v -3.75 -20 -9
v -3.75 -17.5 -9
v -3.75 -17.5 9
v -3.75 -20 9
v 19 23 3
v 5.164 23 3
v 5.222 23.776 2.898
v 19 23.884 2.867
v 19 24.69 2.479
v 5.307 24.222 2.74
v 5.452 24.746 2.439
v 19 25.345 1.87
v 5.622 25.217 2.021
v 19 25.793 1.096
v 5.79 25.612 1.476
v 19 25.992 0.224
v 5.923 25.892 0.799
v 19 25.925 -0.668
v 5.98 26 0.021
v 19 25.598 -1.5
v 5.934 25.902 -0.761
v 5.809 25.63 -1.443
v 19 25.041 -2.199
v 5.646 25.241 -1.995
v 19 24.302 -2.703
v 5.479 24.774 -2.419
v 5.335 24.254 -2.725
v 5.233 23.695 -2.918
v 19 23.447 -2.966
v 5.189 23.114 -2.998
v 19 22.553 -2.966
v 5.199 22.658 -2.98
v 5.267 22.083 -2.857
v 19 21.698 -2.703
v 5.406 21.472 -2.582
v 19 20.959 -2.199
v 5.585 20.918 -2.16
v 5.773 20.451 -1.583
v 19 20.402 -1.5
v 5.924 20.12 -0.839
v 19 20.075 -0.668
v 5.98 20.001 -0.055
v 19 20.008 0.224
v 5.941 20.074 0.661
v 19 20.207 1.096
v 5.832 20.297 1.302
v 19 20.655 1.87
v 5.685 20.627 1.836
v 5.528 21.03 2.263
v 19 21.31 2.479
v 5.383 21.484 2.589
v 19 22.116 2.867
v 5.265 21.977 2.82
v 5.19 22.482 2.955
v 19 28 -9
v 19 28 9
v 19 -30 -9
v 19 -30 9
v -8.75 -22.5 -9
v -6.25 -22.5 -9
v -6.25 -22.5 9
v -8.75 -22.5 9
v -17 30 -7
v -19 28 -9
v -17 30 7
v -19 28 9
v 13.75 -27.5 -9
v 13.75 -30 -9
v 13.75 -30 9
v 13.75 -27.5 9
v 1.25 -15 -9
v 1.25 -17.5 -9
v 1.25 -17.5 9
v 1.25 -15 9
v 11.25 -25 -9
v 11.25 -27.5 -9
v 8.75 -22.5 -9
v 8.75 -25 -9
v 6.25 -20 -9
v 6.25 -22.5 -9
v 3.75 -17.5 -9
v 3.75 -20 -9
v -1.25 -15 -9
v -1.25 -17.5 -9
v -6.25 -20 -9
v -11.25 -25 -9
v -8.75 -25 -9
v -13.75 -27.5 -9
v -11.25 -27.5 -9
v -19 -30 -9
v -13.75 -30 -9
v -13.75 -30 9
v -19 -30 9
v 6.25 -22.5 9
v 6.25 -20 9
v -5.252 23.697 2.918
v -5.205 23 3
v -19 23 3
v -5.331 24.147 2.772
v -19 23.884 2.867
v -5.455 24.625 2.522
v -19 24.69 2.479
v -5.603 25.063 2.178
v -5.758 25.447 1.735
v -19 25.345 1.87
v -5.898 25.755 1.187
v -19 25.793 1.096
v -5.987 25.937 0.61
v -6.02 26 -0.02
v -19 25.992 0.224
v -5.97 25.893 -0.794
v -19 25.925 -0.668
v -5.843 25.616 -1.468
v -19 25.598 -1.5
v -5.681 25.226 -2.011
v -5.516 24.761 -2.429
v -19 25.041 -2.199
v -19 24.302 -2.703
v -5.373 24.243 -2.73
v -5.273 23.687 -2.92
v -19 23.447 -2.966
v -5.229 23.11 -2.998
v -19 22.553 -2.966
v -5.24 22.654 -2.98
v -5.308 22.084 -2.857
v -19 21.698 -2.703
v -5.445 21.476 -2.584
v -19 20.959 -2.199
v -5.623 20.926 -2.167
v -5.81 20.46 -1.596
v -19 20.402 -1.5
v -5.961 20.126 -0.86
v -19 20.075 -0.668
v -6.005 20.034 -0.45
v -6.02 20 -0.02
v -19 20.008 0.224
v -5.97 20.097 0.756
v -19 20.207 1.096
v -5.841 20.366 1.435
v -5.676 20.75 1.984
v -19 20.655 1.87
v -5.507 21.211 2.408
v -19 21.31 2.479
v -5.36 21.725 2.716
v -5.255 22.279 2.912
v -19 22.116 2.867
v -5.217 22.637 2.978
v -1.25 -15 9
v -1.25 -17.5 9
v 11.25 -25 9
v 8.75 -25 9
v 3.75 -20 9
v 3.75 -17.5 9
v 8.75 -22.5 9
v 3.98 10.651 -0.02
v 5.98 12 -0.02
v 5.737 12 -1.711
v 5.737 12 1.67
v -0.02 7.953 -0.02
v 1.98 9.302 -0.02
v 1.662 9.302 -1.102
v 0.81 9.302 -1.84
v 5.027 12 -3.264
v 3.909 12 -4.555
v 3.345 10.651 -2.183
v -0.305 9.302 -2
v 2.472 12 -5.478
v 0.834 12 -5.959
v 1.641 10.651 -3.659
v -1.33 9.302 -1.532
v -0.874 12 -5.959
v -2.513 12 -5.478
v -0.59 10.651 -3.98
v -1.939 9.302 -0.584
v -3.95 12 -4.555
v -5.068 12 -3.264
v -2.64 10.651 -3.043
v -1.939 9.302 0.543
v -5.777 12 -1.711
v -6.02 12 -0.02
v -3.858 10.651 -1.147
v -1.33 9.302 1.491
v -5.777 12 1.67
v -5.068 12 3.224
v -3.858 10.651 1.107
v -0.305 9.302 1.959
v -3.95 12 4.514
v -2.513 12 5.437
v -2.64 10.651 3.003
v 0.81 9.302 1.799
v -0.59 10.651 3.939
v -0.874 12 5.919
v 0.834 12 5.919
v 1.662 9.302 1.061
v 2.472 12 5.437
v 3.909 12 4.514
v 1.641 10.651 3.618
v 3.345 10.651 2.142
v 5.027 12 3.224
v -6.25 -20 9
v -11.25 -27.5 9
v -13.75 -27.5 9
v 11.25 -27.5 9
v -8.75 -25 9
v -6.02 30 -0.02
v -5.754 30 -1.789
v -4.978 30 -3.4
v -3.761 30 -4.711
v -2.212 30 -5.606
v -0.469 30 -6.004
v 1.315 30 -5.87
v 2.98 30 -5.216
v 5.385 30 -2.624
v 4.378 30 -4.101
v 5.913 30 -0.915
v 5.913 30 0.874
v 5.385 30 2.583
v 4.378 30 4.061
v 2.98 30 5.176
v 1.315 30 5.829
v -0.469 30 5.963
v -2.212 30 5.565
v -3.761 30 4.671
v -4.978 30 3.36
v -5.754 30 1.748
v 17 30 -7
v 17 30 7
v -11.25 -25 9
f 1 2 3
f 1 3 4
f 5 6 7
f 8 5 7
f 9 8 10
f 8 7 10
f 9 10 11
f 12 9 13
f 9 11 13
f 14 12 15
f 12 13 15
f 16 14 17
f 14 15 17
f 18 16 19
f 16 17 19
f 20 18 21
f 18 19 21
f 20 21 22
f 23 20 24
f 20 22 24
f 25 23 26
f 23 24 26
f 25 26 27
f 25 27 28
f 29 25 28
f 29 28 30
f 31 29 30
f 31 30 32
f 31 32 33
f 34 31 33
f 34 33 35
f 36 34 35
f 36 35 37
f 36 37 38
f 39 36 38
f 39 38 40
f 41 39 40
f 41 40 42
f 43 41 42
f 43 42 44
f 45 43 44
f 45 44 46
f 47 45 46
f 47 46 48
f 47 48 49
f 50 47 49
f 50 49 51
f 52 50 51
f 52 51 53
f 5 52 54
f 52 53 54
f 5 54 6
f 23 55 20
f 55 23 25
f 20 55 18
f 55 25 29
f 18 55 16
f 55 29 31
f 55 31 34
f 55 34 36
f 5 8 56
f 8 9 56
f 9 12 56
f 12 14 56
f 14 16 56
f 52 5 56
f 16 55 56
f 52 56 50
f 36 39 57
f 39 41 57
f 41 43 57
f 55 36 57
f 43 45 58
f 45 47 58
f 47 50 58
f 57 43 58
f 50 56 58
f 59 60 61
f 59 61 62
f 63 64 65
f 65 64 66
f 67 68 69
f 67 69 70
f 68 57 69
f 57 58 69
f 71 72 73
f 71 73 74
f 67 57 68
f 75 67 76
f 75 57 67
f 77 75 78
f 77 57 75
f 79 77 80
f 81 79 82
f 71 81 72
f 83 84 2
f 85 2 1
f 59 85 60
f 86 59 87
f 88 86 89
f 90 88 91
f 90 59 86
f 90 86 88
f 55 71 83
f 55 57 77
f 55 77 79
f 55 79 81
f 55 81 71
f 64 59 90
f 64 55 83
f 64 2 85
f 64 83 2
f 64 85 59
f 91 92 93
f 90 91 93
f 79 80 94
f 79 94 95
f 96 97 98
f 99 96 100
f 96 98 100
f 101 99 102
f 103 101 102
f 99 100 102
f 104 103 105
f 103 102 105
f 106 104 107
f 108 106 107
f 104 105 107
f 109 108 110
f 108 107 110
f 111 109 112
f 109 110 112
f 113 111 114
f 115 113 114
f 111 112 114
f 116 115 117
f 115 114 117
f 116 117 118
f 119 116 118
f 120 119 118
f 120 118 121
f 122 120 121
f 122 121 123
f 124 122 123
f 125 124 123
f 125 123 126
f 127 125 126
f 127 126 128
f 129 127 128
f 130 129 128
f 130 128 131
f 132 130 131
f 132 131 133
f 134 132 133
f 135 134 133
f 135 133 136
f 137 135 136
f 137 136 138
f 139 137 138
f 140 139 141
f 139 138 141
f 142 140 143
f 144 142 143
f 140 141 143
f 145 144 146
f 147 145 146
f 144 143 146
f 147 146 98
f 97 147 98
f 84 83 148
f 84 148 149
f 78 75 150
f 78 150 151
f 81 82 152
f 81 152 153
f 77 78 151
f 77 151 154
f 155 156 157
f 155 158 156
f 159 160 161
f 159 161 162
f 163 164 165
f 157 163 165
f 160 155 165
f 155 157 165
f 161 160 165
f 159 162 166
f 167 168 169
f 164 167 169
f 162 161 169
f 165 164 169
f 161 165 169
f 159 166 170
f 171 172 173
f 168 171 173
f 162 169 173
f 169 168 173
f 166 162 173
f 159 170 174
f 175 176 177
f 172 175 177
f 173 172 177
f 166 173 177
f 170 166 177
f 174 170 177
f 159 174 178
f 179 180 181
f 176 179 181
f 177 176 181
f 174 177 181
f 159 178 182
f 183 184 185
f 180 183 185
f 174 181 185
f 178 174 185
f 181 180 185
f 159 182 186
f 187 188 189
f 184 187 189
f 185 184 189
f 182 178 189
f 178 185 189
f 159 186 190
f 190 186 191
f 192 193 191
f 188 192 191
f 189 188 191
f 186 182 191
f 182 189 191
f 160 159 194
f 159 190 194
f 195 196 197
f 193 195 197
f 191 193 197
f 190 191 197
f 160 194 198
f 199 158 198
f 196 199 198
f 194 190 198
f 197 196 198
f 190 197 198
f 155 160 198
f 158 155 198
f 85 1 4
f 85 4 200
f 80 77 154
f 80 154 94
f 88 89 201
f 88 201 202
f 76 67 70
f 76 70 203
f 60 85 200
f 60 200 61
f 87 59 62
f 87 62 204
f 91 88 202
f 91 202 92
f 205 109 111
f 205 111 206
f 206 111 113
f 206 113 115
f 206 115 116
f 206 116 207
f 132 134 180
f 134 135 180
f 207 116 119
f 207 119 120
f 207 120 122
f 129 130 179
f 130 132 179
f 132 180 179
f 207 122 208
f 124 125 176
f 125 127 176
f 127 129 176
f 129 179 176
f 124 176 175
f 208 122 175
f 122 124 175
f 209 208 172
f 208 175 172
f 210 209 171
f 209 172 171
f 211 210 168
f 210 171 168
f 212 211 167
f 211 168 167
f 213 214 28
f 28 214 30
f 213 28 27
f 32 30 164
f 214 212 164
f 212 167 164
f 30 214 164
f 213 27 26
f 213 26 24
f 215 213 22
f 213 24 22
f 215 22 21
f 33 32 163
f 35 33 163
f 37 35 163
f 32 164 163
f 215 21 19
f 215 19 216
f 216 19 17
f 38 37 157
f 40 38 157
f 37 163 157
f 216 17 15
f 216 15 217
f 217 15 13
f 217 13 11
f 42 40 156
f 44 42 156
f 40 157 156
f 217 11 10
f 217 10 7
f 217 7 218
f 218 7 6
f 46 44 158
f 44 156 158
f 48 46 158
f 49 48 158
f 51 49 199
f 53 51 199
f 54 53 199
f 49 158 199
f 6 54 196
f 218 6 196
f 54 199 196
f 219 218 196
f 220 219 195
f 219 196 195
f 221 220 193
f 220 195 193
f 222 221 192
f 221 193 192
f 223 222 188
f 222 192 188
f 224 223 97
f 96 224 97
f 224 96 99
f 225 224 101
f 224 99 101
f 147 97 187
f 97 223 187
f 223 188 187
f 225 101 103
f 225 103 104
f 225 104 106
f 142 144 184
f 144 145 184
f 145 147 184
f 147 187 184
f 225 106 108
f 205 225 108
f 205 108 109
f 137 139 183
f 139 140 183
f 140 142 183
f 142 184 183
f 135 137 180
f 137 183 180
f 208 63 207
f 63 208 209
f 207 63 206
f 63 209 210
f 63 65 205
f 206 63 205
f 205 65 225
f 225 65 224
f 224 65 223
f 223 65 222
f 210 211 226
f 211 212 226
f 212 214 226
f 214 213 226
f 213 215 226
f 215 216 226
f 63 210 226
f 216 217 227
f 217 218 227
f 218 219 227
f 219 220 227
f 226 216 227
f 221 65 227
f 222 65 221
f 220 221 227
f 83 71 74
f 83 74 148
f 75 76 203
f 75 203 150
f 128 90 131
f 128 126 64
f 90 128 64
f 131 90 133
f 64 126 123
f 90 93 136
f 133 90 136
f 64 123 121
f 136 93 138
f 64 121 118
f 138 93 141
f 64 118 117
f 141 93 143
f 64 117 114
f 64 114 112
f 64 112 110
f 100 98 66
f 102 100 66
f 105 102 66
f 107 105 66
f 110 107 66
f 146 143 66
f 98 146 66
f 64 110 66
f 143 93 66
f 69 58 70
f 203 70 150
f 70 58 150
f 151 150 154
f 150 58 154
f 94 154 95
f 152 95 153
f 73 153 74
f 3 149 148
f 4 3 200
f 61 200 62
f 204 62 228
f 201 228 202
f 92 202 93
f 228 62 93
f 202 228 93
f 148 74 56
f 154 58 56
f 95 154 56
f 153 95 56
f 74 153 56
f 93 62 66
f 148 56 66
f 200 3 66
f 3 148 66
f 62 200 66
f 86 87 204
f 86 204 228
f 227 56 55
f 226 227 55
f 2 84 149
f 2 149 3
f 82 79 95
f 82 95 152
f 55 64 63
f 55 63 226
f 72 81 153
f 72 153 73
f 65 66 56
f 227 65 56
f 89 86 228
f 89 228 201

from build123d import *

# Parameters (mm, degrees)
BOSS_EXTRUDE1_DEPTH        = 9
F_12_0MM_DOWEL_HOLE1_D     = 12
F_12_0MM_DOWEL_HOLE1_DEPTH = 18
F_12_0MM_DOWEL_HOLE1_TIP   = 4.047051101
SKETCH6_R                  = 3
CUT_EXTRUDE1_DEPTH         = 50.244289009
CHAMFER1_SIZE              = 2


with BuildPart() as part:
    # Sketch1 → Boss-Extrude1 (new, symmetric)
    with BuildSketch(Plane.XY):
        Polygon((-19, 30), (19, 30), (19, -30), (13.75, -30), (13.75, -27.5), (11.25, -27.5), (11.25, -25), (8.75, -25), (8.75, -22.5), (6.25, -22.5), (6.25, -20), (3.75, -20), (3.75, -17.5), (1.25, -17.5), (1.25, -15), (-1.25, -15), (-1.25, -17.5), (-3.75, -17.5), (-3.75, -20), (-6.25, -20), (-6.25, -22.5), (-8.75, -22.5), (-8.75, -25), (-11.25, -25), (-11.25, -27.5), (-13.75, -27.5), (-13.75, -30), (-19, -30), align=None)
    extrude(amount=BOSS_EXTRUDE1_DEPTH, both=True)

    # Ø12.0mm Dowel Hole1
    with Locations(Plane(origin=(-0.020341947, 30, -0.020341947), x_dir=(1, 0, 0), z_dir=(0, 1, 0))):
        with Locations((0, 0)):
            Hole(F_12_0MM_DOWEL_HOLE1_D / 2, depth=F_12_0MM_DOWEL_HOLE1_DEPTH)
            with Locations((0, 0, -(F_12_0MM_DOWEL_HOLE1_DEPTH + F_12_0MM_DOWEL_HOLE1_TIP / 2))):  # 112° drill point
                Cone(0, F_12_0MM_DOWEL_HOLE1_D / 2, F_12_0MM_DOWEL_HOLE1_TIP, mode=Mode.SUBTRACT)

    # Sketch6 → Cut-Extrude1 (cut, through all)
    with BuildSketch(Plane.ZY.offset(19)):
        with Locations((0, 23)):
            Circle(SKETCH6_R)
    extrude(amount=-CUT_EXTRUDE1_DEPTH, mode=Mode.SUBTRACT)

    # Chamfer1
    chamfer1_edges = [part.edges().sort_by_distance(p)[0] for p in [
        (0, 30, 9),
        (0, 30, -9),
        (-19, 30, 0),
        (19, 30, 0),
    ]]
    chamfer(chamfer1_edges, length=CHAMFER1_SIZE)


solid = part.part
